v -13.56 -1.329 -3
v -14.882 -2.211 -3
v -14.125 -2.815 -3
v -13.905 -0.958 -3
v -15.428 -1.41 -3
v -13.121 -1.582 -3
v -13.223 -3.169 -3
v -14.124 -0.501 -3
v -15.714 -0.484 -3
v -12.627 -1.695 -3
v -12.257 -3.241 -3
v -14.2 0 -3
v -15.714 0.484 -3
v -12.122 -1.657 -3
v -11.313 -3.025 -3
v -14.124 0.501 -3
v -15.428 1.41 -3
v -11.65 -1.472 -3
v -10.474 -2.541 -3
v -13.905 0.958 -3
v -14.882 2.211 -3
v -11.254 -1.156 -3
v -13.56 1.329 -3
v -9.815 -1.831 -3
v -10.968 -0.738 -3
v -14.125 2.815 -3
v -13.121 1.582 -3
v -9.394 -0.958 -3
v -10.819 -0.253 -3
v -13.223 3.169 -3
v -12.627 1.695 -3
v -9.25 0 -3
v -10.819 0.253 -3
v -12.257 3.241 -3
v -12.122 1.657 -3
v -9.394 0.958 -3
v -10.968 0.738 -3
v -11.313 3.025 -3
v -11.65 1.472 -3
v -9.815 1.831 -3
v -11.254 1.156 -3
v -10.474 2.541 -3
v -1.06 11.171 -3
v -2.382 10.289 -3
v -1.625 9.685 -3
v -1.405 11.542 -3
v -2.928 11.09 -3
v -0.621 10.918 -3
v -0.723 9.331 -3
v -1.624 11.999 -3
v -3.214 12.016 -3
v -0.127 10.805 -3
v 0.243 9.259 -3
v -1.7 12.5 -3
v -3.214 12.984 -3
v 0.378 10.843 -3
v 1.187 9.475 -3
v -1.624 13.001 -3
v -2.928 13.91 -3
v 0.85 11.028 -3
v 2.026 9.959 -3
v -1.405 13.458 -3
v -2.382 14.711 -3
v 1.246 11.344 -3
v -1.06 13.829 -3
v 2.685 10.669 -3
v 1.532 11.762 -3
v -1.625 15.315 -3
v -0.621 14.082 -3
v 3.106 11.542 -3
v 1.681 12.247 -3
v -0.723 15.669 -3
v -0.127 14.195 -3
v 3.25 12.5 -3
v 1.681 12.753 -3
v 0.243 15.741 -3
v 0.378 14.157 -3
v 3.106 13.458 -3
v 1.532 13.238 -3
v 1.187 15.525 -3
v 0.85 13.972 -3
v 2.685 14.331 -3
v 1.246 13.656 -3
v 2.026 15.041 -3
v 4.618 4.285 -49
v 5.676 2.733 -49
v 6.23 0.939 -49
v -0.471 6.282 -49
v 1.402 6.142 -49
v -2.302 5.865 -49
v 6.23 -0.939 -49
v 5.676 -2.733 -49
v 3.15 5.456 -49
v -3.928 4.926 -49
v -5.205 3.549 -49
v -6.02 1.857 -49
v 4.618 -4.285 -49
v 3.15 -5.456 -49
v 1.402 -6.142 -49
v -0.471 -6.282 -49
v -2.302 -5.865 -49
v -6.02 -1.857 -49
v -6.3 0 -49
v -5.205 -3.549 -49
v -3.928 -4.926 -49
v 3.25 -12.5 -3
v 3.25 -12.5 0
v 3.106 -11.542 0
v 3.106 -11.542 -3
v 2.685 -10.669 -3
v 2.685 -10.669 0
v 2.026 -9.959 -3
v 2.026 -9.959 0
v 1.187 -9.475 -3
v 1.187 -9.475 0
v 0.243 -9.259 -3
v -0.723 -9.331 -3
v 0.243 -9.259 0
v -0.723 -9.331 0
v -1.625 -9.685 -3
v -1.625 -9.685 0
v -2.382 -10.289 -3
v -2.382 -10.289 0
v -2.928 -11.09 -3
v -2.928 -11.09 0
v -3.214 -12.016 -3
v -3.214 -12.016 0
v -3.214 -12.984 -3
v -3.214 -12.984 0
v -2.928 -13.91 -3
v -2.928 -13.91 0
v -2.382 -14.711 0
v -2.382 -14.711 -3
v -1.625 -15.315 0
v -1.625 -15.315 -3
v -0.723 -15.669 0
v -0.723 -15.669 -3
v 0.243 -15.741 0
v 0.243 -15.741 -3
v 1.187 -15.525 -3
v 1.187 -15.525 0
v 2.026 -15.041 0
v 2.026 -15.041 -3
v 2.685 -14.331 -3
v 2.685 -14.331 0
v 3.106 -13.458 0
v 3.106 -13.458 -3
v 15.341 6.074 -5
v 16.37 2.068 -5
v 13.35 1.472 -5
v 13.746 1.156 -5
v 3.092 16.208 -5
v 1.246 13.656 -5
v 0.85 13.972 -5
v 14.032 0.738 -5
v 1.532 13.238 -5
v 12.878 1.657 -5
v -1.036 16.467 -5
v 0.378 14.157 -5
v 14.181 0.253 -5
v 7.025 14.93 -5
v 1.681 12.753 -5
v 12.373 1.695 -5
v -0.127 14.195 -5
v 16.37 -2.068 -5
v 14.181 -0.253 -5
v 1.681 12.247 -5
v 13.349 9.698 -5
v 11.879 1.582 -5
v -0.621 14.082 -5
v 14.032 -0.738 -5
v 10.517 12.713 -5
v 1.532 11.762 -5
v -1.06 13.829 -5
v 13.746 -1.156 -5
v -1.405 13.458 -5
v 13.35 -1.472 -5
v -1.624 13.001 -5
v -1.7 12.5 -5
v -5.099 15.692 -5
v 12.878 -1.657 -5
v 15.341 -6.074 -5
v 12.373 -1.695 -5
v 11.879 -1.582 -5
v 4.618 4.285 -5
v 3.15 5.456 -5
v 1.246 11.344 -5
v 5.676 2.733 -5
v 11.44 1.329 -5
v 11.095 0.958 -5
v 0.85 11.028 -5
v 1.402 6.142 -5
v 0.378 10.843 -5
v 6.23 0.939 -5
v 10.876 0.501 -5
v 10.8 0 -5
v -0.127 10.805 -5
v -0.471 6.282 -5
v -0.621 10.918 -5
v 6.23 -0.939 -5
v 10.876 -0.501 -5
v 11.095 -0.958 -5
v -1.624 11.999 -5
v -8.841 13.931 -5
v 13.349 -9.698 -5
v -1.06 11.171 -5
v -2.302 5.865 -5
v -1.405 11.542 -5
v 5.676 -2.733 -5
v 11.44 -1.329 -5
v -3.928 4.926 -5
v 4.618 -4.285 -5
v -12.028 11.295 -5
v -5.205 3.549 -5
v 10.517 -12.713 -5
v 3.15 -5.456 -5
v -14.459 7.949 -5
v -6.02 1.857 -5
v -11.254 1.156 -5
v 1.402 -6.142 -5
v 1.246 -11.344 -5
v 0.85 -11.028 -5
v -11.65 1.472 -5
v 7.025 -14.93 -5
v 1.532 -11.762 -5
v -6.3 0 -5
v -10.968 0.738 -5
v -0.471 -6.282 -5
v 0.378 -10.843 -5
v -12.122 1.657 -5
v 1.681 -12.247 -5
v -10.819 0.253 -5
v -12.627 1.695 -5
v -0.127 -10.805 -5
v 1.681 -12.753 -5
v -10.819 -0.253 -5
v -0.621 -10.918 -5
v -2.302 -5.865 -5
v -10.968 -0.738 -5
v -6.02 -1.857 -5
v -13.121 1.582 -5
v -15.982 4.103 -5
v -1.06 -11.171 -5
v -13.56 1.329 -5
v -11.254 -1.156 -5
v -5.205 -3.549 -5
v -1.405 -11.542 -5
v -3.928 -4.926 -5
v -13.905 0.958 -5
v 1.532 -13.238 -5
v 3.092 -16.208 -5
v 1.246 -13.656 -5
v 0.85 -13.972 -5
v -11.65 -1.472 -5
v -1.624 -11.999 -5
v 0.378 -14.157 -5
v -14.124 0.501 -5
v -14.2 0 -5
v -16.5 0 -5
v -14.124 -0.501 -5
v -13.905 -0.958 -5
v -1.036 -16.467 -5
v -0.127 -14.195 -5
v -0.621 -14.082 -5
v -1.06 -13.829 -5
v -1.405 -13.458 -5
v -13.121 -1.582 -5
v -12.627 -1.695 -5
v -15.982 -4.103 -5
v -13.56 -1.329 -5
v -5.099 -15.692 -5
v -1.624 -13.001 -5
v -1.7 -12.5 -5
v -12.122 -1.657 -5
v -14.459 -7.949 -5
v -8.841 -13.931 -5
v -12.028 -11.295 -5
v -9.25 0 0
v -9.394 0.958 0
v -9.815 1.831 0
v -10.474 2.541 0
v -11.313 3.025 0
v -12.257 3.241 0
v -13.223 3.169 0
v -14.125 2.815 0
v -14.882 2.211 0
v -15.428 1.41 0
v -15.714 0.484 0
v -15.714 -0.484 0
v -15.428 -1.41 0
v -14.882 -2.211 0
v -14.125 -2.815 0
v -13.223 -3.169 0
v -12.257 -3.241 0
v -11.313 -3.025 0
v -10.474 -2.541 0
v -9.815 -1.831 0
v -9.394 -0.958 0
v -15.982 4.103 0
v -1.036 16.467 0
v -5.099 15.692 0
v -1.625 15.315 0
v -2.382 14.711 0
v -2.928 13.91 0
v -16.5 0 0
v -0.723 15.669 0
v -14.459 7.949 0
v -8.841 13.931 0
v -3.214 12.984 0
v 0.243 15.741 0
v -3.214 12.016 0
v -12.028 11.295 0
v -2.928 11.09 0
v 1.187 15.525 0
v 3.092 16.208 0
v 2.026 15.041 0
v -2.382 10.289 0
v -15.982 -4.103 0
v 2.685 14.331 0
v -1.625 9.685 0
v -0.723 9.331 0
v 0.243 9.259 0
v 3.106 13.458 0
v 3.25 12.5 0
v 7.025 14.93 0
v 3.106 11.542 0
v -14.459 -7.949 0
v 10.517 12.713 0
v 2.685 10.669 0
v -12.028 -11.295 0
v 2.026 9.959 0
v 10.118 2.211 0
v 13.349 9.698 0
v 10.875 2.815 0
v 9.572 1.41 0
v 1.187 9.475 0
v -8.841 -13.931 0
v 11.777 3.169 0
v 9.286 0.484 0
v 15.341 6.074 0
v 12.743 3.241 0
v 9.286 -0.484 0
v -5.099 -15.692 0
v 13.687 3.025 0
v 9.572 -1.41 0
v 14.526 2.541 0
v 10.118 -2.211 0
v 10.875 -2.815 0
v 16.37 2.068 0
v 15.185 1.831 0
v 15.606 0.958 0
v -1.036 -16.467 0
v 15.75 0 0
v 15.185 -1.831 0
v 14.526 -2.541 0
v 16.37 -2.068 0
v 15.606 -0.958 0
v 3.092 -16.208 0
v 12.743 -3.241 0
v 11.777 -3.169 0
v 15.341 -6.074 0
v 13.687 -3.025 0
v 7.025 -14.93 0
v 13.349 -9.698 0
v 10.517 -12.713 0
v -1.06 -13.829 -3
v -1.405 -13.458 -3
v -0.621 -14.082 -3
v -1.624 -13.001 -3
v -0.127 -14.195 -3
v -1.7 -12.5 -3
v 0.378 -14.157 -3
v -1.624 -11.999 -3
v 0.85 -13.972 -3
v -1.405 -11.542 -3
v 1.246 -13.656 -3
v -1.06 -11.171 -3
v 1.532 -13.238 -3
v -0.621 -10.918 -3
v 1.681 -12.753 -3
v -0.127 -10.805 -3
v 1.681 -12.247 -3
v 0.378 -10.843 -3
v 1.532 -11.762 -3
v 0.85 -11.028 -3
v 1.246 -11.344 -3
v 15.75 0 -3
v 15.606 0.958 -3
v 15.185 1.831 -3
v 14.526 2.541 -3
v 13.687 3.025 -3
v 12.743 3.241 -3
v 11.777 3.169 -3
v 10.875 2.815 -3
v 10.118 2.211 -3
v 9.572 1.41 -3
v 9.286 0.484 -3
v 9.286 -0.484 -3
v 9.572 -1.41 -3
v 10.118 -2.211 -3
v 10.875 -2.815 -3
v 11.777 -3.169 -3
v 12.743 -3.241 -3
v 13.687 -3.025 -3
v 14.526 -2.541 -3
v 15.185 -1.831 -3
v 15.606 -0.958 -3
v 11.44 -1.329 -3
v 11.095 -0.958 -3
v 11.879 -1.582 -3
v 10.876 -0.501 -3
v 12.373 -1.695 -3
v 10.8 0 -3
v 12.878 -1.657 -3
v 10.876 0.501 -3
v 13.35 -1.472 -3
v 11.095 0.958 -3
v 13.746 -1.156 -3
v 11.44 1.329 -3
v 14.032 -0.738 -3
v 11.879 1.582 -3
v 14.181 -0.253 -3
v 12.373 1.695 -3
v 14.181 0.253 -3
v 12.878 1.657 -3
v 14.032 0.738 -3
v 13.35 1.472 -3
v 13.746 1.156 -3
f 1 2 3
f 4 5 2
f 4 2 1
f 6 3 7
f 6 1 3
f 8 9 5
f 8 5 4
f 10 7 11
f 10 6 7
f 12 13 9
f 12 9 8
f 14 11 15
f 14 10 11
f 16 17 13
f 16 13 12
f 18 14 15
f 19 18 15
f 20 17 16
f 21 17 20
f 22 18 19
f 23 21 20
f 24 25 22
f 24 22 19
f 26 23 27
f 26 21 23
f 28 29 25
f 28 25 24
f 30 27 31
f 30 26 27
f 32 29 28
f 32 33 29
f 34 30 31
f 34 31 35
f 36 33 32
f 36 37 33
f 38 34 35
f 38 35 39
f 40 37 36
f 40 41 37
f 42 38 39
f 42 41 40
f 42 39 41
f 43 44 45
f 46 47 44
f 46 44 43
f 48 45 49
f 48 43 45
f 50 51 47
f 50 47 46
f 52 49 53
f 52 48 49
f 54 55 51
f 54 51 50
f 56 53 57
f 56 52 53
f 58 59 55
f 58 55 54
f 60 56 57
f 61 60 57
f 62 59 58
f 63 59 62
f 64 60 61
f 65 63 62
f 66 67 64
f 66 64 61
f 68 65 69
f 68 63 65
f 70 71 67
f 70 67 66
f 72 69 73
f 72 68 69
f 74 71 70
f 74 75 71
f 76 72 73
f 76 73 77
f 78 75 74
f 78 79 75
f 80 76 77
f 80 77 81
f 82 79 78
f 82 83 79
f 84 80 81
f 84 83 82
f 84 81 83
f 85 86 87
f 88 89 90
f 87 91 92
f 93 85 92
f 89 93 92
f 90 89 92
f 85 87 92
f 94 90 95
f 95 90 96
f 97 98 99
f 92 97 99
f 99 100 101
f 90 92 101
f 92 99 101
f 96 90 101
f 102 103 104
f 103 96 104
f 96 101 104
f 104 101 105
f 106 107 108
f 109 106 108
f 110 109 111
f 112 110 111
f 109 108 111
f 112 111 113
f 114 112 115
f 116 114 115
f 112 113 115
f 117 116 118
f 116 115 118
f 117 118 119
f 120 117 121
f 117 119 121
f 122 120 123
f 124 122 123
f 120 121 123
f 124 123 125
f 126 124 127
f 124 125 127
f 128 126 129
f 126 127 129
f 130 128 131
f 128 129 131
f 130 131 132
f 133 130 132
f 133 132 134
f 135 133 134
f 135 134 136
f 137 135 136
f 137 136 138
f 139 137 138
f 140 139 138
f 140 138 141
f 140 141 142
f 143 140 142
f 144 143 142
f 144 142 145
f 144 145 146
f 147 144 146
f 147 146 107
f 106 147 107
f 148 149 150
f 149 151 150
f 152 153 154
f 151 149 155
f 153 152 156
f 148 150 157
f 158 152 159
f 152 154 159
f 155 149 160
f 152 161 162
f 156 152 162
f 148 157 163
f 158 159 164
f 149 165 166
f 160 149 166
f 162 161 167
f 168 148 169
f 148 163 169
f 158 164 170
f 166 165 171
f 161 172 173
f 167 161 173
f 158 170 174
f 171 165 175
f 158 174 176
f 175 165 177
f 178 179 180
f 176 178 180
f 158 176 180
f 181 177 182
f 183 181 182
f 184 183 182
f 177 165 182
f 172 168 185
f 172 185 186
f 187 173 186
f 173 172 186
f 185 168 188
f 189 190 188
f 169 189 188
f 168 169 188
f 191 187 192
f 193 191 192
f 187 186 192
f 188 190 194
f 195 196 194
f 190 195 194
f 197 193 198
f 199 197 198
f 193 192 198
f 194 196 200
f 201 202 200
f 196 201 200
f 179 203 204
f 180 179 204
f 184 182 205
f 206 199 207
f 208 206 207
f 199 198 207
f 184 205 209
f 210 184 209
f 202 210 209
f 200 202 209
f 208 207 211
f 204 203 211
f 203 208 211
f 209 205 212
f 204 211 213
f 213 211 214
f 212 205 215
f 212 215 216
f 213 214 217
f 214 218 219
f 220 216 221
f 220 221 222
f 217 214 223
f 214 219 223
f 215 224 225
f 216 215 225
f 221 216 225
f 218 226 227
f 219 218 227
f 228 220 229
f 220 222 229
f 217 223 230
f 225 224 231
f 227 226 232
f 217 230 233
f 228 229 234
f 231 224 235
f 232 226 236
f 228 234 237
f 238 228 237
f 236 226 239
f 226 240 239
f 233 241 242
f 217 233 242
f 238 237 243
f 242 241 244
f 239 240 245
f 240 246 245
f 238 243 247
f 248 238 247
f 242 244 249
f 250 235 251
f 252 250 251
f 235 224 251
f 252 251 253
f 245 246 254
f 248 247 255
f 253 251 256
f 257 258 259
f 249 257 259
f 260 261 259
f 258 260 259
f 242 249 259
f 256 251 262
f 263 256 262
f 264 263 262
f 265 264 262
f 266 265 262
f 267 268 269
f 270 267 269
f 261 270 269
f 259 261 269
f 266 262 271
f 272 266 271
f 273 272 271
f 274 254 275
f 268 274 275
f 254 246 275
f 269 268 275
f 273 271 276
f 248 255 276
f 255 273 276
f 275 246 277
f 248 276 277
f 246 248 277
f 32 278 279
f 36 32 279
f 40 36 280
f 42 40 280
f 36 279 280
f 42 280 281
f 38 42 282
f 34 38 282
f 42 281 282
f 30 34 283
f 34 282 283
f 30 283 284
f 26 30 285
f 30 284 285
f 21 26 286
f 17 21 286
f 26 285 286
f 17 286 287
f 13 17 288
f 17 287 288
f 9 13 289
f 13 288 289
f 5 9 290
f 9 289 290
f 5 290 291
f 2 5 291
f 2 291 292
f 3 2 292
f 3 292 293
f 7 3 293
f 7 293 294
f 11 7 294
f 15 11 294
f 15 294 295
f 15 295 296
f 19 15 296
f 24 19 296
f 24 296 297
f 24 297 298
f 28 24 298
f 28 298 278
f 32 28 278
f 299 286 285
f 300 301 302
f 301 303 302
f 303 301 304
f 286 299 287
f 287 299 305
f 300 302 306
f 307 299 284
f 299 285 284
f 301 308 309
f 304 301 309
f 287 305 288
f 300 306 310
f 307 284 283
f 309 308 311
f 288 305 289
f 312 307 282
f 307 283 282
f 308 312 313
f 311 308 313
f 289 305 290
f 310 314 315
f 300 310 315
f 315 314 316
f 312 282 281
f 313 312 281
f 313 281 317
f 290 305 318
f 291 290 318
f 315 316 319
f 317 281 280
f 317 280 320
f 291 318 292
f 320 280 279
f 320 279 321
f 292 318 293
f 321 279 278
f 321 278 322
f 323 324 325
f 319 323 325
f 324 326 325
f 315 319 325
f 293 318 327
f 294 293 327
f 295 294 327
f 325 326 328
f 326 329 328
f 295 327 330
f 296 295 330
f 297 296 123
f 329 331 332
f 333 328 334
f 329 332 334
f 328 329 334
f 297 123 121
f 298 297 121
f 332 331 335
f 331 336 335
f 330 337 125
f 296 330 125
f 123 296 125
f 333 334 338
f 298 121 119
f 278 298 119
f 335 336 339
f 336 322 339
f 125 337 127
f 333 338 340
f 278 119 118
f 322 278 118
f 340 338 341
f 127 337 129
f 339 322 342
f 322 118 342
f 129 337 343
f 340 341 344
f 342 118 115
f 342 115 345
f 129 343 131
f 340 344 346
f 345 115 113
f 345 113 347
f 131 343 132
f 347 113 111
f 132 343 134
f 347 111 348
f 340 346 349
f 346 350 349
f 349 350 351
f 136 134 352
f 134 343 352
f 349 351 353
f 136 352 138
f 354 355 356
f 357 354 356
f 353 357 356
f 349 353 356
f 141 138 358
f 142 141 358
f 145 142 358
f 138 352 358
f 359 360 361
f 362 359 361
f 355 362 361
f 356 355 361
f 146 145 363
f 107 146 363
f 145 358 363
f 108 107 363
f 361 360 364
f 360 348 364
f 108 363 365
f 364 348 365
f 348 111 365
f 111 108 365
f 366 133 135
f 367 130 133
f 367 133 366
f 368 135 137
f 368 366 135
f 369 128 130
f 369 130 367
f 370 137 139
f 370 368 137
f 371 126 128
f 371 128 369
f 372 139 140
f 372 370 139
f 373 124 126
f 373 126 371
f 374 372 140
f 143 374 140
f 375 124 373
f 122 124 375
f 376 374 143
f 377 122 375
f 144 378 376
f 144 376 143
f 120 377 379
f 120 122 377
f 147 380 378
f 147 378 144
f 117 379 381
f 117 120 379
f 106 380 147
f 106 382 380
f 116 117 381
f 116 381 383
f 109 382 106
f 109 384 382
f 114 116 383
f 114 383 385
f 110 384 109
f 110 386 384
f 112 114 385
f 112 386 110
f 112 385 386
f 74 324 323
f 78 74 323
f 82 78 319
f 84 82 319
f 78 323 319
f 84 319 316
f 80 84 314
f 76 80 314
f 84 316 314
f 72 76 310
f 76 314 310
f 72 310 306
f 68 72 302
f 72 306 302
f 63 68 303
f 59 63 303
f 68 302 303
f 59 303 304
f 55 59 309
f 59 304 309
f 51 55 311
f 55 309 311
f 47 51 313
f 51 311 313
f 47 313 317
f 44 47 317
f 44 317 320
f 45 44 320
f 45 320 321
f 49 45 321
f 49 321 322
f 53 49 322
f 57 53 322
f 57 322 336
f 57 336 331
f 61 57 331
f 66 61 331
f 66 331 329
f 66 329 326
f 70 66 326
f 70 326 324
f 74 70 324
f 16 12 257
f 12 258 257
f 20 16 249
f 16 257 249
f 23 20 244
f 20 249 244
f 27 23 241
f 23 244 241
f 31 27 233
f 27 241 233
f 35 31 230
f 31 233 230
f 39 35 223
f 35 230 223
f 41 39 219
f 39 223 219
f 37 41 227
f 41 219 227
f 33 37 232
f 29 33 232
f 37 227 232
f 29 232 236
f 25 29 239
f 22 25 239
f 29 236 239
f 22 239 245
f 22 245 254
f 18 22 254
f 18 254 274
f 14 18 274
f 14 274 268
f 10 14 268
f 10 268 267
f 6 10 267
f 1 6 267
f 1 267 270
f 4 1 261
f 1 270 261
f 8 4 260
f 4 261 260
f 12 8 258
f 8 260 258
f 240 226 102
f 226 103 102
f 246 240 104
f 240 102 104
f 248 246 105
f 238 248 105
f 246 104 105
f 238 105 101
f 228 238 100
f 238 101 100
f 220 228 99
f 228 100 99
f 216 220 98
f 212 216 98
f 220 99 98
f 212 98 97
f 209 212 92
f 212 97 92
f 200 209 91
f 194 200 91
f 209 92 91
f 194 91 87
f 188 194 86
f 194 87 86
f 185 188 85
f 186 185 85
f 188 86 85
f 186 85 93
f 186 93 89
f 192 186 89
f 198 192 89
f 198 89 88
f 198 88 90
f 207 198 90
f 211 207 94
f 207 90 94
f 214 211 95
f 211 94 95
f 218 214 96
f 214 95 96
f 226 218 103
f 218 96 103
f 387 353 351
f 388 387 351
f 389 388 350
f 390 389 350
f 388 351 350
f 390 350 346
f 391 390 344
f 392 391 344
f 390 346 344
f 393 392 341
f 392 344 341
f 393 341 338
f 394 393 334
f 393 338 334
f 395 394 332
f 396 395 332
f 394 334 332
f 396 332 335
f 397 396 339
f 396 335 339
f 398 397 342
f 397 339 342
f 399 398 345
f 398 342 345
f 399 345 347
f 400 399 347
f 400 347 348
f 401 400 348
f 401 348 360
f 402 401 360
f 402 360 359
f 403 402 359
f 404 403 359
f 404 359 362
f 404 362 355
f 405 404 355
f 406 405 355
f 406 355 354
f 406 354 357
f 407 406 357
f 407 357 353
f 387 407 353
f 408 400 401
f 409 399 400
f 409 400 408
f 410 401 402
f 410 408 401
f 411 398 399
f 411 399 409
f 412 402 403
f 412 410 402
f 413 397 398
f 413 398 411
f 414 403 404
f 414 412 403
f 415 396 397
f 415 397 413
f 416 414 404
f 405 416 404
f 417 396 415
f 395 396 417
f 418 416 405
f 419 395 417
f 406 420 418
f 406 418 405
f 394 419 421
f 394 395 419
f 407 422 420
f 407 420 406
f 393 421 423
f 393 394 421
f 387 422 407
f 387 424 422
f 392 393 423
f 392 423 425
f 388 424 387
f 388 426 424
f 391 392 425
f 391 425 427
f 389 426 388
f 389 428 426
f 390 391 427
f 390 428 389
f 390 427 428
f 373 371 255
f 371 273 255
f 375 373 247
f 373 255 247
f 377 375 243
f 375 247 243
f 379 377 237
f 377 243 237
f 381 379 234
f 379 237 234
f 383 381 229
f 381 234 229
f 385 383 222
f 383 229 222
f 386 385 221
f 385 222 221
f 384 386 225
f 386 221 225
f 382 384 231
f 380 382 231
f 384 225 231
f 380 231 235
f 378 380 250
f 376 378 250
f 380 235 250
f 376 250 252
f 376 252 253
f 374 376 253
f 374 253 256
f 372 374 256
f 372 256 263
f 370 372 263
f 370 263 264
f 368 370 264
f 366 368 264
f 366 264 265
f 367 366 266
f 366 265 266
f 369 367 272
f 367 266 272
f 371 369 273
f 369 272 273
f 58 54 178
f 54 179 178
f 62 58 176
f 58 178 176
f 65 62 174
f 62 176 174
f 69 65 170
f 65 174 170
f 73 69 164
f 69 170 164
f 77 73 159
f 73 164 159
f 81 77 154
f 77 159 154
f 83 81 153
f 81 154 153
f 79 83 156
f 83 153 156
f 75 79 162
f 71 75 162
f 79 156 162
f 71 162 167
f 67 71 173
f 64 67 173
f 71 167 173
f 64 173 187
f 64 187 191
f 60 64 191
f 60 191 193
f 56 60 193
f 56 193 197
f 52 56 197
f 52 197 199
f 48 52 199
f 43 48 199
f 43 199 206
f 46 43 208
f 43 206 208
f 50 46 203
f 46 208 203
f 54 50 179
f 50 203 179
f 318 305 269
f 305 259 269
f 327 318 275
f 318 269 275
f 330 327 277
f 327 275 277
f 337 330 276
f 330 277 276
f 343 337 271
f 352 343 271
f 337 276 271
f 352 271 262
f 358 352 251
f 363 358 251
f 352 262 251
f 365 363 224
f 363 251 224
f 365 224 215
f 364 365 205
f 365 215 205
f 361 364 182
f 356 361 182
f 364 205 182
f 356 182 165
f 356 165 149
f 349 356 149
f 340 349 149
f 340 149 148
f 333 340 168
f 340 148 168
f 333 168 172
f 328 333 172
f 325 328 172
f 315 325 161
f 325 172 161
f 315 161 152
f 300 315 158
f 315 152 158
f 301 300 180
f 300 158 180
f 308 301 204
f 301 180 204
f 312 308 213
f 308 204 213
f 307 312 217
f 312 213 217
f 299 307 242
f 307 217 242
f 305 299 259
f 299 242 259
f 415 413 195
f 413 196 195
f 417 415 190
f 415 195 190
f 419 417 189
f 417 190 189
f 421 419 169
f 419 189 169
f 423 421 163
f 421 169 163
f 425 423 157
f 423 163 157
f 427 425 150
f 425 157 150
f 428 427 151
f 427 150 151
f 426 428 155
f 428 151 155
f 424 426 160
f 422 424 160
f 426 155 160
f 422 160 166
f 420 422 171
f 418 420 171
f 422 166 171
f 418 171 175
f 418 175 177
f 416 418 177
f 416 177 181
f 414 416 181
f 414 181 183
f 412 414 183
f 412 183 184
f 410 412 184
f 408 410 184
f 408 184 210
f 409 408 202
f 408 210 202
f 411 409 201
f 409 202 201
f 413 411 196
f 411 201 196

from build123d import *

# Parameters (mm, degrees)
HOLE_WIZARD_M31_D           = 3.4
HOLE_WIZARD_M31_CBORE_D     = 6.5
HOLE_WIZARD_M31_CBORE_DEPTH = 3


with BuildPart() as part:
    # Эскиз2 → Повернуть1 (revolve)
    with BuildSketch(Plane(origin=(0, 0, 0), x_dir=(0, 0, -1), z_dir=(1, 0, 0)), mode=Mode.PRIVATE) as revolve_1_sk:
        Polygon((0, 0), (0, 16.5), (5, 16.5), (5, 6.3), (49, 6.3), (49, 0), align=None)
    revolve(revolve_1_sk.sketch.rotate(Axis((0, 0, -49), (0, 0, 1)), 90), axis=Axis((0, 0, -49), (0, 0, 1)))

    # Цековка для винта с внутренним шестигранником M31 (through all)
    with Locations(Plane.XY):
        with Locations((-12.5, 0), (0, 12.5), (12.5, 0), (0, -12.5)):
            CounterBoreHole(HOLE_WIZARD_M31_D / 2, HOLE_WIZARD_M31_CBORE_D / 2, HOLE_WIZARD_M31_CBORE_DEPTH)


solid = part.part
